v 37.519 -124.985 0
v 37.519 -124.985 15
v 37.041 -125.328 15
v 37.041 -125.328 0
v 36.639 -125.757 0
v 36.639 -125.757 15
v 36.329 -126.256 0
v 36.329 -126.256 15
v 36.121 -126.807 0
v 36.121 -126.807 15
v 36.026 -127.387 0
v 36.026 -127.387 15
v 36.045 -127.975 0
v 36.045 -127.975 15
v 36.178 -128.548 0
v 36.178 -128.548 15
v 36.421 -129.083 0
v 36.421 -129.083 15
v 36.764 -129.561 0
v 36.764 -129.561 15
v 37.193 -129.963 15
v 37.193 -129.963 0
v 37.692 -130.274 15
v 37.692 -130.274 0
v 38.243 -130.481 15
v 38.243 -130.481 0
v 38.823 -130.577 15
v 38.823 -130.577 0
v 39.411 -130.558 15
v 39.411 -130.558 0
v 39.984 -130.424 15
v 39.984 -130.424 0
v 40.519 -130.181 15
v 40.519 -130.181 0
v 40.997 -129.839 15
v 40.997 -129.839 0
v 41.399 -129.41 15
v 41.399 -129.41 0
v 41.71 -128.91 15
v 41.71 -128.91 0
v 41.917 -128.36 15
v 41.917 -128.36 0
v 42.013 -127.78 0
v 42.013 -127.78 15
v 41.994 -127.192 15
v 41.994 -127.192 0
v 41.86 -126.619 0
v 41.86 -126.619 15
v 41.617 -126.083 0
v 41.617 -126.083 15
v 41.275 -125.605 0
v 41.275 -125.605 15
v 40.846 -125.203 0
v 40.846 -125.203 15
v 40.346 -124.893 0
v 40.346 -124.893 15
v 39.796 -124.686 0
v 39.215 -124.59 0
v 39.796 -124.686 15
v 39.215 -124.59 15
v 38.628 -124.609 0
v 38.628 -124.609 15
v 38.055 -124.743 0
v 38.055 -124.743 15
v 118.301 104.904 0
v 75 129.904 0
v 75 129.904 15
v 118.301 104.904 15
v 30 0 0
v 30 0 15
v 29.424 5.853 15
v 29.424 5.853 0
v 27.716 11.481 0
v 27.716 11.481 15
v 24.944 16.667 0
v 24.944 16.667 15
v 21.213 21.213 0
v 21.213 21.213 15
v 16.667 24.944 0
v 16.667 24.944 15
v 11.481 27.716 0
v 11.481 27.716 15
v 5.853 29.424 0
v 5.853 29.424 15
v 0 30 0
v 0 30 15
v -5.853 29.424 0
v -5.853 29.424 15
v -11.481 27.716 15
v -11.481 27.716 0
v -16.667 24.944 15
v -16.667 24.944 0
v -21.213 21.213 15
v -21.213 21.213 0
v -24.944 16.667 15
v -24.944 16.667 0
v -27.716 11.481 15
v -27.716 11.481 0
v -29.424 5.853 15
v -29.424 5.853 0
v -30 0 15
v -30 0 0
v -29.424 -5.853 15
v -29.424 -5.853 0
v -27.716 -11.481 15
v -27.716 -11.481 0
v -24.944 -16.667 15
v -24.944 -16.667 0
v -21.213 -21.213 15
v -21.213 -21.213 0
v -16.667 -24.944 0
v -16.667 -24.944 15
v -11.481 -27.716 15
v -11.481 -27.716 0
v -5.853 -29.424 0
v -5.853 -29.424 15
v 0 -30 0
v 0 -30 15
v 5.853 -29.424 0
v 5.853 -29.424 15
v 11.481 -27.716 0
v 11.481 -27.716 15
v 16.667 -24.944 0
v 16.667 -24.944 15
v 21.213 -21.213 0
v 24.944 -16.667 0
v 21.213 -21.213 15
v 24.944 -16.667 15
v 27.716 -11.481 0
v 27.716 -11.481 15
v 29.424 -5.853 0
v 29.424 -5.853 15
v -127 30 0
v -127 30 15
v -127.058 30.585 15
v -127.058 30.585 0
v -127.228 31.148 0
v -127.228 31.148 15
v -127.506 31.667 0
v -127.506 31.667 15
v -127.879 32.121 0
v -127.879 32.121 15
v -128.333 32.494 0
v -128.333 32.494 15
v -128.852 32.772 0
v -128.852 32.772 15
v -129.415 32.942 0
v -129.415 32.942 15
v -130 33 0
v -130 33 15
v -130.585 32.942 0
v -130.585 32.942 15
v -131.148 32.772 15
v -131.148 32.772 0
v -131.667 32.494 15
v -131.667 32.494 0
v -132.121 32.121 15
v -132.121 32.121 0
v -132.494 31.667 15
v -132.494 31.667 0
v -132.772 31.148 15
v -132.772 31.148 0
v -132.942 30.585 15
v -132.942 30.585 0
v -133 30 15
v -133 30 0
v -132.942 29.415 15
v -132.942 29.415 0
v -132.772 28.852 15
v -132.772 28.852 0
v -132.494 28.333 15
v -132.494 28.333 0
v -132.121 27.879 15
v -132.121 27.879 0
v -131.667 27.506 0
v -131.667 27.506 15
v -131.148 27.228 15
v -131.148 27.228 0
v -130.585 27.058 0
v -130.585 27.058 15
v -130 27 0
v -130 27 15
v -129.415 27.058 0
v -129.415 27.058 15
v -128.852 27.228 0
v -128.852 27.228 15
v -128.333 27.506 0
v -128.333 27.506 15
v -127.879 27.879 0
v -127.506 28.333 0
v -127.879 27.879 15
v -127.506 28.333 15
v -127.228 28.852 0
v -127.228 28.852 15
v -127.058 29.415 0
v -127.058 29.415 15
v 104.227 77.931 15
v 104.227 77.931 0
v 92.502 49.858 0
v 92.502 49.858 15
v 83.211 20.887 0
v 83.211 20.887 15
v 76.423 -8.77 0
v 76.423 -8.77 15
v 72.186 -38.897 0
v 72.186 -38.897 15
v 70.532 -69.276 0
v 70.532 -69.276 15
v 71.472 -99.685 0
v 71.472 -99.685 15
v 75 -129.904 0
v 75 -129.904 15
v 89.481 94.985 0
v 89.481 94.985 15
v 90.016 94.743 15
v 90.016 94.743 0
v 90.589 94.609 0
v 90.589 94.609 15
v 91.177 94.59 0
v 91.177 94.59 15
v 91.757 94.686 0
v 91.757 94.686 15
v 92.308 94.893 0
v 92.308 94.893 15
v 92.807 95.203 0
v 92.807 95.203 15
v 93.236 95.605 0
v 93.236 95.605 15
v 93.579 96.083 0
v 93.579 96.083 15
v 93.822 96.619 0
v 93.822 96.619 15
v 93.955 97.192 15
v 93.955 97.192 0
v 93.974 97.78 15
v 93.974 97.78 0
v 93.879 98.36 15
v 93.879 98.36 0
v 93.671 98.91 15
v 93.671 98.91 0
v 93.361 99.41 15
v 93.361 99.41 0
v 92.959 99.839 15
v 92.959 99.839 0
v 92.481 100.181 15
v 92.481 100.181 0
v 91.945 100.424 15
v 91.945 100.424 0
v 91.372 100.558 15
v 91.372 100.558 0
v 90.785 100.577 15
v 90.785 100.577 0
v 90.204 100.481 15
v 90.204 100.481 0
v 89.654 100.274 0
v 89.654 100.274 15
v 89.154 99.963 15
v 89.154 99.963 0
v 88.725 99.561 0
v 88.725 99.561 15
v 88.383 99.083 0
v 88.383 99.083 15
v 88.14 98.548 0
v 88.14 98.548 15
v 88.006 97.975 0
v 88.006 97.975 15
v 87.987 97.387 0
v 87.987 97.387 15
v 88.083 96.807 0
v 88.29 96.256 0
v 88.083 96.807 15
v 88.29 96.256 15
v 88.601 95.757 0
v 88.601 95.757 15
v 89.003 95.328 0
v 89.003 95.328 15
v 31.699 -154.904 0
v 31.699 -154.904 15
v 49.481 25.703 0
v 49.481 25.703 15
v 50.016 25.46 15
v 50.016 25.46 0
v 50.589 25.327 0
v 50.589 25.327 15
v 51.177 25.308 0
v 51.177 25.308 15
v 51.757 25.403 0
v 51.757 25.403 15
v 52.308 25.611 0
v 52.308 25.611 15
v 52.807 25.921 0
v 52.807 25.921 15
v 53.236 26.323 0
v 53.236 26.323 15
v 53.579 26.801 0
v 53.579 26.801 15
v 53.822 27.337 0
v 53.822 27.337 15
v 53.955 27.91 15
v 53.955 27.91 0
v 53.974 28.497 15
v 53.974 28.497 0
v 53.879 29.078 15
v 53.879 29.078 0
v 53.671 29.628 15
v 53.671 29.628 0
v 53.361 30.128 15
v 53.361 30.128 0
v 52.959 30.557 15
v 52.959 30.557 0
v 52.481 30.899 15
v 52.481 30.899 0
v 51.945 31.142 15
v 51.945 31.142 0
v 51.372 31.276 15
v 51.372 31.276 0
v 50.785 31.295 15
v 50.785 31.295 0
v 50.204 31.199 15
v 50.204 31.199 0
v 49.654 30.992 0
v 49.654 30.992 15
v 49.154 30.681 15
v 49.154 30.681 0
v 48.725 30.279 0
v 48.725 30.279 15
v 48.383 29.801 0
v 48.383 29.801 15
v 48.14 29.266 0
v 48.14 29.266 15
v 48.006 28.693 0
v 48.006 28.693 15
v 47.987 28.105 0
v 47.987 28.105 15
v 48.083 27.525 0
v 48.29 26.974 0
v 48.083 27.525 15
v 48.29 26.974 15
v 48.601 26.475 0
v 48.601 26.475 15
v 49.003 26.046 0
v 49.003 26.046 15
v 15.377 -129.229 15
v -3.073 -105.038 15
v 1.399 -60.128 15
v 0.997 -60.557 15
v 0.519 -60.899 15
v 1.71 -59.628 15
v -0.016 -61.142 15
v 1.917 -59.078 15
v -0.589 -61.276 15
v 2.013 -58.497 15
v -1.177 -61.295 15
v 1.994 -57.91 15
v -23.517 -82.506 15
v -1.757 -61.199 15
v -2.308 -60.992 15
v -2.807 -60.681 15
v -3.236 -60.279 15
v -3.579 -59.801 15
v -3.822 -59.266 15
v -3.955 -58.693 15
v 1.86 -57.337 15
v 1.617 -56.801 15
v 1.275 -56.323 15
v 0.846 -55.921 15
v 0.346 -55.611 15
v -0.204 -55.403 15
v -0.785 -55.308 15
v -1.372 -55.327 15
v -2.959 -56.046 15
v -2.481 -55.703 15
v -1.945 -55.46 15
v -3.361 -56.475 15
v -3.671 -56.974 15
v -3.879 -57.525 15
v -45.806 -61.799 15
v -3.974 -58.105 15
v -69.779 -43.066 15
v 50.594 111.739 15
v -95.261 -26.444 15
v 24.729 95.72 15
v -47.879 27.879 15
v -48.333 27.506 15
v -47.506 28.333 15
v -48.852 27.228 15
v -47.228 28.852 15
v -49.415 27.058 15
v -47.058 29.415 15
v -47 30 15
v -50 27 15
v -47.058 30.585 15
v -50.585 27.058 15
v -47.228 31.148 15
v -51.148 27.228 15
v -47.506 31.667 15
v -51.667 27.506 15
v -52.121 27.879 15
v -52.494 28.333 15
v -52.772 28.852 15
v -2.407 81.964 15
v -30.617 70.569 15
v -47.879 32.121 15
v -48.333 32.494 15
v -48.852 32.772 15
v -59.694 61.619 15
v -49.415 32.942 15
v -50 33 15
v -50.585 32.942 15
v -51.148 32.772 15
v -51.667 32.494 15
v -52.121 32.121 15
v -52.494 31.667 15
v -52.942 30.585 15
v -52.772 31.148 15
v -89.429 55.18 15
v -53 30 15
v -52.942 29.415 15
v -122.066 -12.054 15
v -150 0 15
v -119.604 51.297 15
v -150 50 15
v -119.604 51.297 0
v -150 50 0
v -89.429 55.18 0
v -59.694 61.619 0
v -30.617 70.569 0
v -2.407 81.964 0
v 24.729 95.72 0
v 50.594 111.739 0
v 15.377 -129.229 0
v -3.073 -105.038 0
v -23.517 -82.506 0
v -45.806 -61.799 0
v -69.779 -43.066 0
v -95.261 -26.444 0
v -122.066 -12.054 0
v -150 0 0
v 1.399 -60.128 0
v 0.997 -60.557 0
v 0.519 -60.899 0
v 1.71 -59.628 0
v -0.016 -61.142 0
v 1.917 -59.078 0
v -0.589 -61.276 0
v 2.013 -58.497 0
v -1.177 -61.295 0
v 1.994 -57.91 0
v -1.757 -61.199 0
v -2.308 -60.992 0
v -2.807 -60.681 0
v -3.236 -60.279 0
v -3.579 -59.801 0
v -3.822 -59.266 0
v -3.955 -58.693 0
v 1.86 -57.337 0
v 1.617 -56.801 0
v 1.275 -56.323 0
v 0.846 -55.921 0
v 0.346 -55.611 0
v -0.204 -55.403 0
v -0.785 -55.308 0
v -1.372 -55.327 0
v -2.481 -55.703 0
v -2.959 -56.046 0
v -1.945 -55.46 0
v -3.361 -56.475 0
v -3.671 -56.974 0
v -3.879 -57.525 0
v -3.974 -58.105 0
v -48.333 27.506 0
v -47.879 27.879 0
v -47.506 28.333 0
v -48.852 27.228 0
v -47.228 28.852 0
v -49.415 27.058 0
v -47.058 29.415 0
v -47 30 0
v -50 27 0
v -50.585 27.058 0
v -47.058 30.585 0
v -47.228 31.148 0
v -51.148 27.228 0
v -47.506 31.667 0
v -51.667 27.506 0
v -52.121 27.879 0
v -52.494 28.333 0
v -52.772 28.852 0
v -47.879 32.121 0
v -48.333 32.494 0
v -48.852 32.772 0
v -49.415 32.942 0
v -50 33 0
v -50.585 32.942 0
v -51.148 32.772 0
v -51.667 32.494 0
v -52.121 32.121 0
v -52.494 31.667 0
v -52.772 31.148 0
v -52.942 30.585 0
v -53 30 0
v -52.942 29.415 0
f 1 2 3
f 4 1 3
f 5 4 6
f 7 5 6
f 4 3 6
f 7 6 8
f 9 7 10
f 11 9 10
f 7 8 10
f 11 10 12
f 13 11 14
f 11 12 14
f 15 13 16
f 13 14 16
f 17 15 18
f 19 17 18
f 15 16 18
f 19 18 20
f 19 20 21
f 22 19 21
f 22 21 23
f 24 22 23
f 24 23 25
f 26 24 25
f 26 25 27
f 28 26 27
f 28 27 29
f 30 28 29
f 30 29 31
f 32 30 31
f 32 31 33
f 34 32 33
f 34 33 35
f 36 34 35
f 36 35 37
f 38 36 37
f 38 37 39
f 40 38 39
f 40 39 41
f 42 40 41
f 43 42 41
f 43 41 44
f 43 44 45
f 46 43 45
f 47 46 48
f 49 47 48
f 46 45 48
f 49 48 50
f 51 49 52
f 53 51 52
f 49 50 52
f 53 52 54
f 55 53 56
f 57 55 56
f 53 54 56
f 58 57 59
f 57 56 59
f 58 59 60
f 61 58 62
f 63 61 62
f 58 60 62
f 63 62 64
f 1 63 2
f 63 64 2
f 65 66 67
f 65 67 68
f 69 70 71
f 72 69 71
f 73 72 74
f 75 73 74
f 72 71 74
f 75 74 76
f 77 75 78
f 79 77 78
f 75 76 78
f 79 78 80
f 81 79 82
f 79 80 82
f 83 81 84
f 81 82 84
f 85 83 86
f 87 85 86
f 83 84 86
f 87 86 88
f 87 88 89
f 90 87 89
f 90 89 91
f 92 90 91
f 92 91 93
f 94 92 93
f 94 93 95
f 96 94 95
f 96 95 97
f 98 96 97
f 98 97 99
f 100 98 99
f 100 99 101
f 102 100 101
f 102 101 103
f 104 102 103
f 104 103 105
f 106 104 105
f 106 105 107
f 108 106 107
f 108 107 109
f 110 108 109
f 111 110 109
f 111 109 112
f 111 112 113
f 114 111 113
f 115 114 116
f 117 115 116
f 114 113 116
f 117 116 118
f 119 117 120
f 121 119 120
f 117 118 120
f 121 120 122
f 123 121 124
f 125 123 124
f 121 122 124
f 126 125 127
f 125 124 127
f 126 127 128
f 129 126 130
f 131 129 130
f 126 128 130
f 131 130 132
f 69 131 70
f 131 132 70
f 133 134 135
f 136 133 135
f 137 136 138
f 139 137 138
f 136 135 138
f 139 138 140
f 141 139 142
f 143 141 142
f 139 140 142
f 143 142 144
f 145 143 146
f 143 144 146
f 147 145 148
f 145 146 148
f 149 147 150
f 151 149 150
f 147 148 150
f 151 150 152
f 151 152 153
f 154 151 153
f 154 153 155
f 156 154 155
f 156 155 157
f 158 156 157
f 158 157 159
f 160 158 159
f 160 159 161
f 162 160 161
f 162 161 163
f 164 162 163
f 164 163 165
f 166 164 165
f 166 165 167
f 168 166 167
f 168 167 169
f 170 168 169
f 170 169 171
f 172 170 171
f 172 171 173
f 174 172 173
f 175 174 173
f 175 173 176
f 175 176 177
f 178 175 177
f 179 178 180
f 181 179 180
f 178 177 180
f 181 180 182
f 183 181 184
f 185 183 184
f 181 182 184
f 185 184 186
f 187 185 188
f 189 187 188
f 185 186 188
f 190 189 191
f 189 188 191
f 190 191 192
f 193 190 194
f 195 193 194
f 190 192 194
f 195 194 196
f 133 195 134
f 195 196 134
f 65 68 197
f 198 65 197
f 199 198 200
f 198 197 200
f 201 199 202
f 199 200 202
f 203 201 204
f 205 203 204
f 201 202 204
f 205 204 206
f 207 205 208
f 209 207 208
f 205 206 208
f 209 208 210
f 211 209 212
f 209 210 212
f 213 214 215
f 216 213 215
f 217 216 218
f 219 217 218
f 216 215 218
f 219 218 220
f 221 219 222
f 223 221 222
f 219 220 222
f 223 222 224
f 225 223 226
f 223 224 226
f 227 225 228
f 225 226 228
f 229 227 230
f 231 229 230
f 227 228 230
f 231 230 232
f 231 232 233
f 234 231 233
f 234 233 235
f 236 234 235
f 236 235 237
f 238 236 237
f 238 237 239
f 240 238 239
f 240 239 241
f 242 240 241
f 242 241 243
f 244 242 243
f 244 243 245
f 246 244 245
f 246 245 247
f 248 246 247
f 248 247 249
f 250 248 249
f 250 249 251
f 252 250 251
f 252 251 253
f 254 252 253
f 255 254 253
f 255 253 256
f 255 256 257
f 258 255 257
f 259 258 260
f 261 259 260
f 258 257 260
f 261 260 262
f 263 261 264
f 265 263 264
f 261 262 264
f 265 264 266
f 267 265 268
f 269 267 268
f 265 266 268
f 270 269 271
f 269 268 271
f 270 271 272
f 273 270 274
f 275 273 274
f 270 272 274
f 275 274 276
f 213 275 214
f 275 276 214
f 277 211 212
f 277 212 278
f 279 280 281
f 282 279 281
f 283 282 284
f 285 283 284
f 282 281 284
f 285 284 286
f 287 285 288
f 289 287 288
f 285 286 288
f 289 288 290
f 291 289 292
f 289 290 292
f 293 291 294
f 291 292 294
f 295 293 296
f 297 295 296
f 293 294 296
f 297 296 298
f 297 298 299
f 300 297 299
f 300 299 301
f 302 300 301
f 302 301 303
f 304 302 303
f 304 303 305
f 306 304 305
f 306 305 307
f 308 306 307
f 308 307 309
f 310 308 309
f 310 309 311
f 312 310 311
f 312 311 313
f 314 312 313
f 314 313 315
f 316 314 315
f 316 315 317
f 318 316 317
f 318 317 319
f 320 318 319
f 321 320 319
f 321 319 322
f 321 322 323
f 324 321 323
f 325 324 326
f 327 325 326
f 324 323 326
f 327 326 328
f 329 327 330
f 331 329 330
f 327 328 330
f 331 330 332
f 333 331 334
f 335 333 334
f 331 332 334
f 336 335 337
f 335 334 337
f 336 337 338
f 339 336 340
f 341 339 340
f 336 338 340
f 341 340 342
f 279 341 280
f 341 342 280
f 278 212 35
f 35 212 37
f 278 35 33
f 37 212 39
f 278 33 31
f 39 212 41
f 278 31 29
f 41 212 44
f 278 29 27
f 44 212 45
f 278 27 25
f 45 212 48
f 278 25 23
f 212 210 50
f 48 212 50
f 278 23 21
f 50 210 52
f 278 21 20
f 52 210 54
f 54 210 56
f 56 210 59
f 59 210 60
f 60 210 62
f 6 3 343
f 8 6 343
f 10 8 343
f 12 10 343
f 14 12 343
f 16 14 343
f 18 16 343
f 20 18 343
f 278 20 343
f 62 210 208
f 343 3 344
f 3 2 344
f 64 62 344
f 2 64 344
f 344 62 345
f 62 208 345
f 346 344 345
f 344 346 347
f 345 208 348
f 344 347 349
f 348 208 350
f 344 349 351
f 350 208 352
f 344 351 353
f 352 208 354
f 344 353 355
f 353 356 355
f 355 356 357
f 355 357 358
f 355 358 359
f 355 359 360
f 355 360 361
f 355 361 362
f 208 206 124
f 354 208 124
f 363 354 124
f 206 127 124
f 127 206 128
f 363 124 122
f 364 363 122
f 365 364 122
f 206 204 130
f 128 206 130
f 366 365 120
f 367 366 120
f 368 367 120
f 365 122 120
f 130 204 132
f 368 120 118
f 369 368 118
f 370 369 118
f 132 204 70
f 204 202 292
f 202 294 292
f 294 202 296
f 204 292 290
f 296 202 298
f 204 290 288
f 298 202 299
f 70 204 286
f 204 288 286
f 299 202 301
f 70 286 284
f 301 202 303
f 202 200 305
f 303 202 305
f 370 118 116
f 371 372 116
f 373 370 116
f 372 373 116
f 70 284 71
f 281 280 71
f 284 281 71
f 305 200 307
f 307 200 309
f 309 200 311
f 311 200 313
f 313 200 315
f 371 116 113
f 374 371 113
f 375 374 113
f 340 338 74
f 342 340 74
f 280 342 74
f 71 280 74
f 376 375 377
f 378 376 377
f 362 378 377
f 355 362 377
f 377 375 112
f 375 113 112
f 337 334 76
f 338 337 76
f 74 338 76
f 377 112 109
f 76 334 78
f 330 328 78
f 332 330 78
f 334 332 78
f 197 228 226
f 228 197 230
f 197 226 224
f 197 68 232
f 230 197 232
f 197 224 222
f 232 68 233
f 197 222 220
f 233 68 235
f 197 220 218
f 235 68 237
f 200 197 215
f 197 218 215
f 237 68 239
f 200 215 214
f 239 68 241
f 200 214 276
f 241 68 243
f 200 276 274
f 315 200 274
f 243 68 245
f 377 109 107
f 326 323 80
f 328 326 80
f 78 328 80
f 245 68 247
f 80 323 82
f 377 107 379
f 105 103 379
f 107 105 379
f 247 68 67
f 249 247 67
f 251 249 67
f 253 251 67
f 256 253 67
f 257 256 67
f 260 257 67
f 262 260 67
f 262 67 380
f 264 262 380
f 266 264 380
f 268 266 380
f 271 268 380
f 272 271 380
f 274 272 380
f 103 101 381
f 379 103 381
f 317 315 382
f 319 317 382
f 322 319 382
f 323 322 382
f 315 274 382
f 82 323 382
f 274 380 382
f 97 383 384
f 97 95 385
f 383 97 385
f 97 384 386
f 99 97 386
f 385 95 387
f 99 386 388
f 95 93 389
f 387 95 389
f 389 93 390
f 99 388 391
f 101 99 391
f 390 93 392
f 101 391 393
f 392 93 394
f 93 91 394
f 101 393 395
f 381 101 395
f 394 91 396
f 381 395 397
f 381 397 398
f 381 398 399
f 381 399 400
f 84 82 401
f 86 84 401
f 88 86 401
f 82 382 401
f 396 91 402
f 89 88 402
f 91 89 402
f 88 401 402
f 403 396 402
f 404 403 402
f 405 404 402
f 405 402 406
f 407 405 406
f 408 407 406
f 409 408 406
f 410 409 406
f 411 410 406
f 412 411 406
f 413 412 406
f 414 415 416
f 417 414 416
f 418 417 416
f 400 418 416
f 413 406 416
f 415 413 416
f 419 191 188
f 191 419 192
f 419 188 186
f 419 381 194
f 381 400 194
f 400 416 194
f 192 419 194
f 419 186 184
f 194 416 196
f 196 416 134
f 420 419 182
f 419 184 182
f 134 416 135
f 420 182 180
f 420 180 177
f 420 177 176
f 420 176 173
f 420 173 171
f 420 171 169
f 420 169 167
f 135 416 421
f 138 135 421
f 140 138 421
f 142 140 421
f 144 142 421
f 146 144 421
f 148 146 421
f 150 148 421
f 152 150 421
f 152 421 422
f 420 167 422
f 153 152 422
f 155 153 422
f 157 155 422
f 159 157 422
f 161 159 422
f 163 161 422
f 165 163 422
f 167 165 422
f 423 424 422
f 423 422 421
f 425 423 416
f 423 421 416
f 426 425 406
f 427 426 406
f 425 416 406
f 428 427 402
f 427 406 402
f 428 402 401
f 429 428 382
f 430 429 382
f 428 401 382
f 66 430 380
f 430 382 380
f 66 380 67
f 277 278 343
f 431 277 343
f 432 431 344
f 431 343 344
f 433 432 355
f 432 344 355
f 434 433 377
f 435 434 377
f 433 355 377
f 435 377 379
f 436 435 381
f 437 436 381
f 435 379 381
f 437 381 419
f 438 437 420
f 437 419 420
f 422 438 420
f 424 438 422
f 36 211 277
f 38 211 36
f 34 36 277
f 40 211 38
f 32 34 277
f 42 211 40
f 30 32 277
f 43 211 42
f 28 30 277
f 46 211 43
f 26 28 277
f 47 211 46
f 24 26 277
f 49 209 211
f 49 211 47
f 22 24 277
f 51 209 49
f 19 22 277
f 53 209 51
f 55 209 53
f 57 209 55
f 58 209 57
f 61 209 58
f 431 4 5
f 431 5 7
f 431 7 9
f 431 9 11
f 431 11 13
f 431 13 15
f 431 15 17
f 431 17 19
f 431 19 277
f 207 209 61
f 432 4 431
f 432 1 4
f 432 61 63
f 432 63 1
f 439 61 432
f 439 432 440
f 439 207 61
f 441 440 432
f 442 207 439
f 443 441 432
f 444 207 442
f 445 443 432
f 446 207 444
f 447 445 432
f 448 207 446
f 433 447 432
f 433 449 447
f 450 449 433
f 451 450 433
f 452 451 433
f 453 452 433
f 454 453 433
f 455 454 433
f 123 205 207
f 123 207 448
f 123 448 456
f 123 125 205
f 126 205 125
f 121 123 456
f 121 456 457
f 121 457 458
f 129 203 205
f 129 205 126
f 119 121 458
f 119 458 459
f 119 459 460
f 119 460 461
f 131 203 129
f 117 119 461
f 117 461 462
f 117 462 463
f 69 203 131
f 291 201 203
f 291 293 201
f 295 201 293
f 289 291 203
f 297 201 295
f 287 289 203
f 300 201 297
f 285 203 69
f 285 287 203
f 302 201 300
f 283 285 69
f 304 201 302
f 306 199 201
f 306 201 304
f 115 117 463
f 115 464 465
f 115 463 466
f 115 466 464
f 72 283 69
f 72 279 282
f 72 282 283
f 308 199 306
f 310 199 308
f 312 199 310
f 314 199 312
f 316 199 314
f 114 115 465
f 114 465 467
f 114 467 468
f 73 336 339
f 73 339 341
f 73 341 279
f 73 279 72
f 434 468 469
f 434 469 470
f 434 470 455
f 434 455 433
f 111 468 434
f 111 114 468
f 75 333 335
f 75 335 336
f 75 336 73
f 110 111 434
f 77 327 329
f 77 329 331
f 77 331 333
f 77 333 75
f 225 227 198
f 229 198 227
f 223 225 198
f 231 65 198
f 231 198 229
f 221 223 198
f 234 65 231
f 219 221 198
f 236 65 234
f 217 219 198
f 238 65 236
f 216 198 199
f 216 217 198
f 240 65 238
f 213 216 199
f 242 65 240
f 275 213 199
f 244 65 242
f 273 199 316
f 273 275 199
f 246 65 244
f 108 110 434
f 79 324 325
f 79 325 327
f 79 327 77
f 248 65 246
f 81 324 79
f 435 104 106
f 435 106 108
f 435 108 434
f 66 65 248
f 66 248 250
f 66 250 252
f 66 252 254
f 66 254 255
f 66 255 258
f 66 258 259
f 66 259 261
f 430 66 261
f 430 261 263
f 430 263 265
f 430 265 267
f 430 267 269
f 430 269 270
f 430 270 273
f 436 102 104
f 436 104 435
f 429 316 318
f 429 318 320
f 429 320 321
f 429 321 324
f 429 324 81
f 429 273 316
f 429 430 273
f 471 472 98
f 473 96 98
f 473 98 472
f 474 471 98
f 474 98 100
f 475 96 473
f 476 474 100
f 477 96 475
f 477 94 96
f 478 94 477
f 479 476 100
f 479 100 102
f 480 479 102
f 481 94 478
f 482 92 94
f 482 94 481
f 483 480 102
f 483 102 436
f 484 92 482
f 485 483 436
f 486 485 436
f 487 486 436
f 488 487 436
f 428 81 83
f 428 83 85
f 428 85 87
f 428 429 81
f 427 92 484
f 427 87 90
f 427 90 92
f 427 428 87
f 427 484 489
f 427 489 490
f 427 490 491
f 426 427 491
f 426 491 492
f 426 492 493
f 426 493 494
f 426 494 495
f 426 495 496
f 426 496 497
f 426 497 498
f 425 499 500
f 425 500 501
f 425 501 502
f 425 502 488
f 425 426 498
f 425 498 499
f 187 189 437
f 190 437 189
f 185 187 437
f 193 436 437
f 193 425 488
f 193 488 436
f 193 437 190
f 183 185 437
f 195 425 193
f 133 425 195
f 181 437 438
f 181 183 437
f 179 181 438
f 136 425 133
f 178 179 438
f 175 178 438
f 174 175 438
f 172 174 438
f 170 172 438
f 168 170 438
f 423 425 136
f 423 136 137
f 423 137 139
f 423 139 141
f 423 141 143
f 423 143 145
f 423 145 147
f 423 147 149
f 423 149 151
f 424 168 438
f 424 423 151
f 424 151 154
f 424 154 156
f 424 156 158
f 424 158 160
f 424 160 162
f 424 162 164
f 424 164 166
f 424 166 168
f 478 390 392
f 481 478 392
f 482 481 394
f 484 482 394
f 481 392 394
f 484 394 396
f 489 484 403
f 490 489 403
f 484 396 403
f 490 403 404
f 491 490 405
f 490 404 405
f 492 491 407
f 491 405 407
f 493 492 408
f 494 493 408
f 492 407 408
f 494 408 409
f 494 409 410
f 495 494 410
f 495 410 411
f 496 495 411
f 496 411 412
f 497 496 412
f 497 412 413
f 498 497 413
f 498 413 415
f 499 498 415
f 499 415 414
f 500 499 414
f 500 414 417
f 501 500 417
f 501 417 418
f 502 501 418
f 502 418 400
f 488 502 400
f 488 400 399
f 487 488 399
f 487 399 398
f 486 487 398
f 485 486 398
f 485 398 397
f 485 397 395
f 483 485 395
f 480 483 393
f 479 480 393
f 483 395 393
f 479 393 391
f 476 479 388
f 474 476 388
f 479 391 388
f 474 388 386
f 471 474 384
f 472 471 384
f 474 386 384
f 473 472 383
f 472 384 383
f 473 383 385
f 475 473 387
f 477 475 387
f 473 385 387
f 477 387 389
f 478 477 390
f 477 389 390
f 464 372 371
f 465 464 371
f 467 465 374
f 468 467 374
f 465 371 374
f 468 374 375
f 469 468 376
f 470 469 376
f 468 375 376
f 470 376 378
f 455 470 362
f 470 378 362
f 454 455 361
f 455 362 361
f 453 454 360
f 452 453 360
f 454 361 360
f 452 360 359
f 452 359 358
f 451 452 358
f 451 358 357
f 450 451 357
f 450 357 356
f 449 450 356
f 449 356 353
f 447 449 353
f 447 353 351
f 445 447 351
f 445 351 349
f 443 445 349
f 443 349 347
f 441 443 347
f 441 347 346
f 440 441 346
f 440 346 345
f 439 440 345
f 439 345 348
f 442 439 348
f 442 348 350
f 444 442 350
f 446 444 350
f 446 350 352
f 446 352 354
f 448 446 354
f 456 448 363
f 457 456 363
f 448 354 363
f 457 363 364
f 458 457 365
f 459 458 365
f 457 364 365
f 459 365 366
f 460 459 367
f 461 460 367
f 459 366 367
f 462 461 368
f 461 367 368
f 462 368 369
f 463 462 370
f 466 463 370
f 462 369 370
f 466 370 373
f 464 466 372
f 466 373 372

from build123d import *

# Parameters (mm, degrees)
PAD_DEPTH             = 15
SKETCH001_R           = 3
POCKET_DEPTH          = 798.1381594859
POLARPATTERN_COUNT    = 3
POCKET001_DEPTH       = 798.1381594859
POLARPATTERN001_COUNT = 3
SKETCH003_R           = 30
POCKET002_DEPTH       = 15.001


with BuildPart() as part:
    # Sketch → Pad (new body)
    with BuildSketch(Plane.XY):
        Polygon((-150, 0), (-150, 50), (75, 129.9038105677), (118.3012701892, 104.9038105677), (75, -129.9038105677), (31.6987298108, -154.9038105677), align=None)
    extrude(amount=PAD_DEPTH)

    # Sketch001 (on Face8 of Pad) → Pocket (cut, through all)
    with BuildSketch(Plane.XY.offset(15)):
        with Locations((-130, 30)):
            Circle(SKETCH001_R)
        with Locations((-50, 30)):
            Circle(SKETCH001_R)
    pocket = extrude(amount=-POCKET_DEPTH, mode=Mode.SUBTRACT)

    # PolarPattern: Pocket ×3 about axis
    polarpattern_axis = Axis((0, 0, 0), (0, 0, 1))
    for i in range(1, POLARPATTERN_COUNT):
        add(pocket.rotate(polarpattern_axis, i * 360 / POLARPATTERN_COUNT), mode=Mode.SUBTRACT)

    # Sketch002 (on Face5 of PolarPattern) → Pocket001 (cut, through all)
    with BuildSketch(Plane.XY.offset(15)):
        with BuildLine():
            ThreePointArc((-150, 50), (-30.6165642318, 70.5689367266), (75, 129.9038105677))
            Line((-150, 50), (75, 129.9038105677))
        make_face()
    pocket001 = extrude(amount=-POCKET001_DEPTH, mode=Mode.SUBTRACT)

    # PolarPattern001: Pocket001 ×3 about axis
    polarpattern001_axis = Axis((0, 0, 0), (0, 0, 1))
    for i in range(1, POLARPATTERN001_COUNT):
        add(pocket001.rotate(polarpattern001_axis, i * 360 / POLARPATTERN001_COUNT), mode=Mode.SUBTRACT)

    # Sketch003 (on Face5 of PolarPattern001) → Pocket002 (cut, through all)
    with BuildSketch(Plane.XY.offset(15)):
        Circle(SKETCH003_R)
    extrude(amount=-POCKET002_DEPTH, mode=Mode.SUBTRACT)


solid = part.part
